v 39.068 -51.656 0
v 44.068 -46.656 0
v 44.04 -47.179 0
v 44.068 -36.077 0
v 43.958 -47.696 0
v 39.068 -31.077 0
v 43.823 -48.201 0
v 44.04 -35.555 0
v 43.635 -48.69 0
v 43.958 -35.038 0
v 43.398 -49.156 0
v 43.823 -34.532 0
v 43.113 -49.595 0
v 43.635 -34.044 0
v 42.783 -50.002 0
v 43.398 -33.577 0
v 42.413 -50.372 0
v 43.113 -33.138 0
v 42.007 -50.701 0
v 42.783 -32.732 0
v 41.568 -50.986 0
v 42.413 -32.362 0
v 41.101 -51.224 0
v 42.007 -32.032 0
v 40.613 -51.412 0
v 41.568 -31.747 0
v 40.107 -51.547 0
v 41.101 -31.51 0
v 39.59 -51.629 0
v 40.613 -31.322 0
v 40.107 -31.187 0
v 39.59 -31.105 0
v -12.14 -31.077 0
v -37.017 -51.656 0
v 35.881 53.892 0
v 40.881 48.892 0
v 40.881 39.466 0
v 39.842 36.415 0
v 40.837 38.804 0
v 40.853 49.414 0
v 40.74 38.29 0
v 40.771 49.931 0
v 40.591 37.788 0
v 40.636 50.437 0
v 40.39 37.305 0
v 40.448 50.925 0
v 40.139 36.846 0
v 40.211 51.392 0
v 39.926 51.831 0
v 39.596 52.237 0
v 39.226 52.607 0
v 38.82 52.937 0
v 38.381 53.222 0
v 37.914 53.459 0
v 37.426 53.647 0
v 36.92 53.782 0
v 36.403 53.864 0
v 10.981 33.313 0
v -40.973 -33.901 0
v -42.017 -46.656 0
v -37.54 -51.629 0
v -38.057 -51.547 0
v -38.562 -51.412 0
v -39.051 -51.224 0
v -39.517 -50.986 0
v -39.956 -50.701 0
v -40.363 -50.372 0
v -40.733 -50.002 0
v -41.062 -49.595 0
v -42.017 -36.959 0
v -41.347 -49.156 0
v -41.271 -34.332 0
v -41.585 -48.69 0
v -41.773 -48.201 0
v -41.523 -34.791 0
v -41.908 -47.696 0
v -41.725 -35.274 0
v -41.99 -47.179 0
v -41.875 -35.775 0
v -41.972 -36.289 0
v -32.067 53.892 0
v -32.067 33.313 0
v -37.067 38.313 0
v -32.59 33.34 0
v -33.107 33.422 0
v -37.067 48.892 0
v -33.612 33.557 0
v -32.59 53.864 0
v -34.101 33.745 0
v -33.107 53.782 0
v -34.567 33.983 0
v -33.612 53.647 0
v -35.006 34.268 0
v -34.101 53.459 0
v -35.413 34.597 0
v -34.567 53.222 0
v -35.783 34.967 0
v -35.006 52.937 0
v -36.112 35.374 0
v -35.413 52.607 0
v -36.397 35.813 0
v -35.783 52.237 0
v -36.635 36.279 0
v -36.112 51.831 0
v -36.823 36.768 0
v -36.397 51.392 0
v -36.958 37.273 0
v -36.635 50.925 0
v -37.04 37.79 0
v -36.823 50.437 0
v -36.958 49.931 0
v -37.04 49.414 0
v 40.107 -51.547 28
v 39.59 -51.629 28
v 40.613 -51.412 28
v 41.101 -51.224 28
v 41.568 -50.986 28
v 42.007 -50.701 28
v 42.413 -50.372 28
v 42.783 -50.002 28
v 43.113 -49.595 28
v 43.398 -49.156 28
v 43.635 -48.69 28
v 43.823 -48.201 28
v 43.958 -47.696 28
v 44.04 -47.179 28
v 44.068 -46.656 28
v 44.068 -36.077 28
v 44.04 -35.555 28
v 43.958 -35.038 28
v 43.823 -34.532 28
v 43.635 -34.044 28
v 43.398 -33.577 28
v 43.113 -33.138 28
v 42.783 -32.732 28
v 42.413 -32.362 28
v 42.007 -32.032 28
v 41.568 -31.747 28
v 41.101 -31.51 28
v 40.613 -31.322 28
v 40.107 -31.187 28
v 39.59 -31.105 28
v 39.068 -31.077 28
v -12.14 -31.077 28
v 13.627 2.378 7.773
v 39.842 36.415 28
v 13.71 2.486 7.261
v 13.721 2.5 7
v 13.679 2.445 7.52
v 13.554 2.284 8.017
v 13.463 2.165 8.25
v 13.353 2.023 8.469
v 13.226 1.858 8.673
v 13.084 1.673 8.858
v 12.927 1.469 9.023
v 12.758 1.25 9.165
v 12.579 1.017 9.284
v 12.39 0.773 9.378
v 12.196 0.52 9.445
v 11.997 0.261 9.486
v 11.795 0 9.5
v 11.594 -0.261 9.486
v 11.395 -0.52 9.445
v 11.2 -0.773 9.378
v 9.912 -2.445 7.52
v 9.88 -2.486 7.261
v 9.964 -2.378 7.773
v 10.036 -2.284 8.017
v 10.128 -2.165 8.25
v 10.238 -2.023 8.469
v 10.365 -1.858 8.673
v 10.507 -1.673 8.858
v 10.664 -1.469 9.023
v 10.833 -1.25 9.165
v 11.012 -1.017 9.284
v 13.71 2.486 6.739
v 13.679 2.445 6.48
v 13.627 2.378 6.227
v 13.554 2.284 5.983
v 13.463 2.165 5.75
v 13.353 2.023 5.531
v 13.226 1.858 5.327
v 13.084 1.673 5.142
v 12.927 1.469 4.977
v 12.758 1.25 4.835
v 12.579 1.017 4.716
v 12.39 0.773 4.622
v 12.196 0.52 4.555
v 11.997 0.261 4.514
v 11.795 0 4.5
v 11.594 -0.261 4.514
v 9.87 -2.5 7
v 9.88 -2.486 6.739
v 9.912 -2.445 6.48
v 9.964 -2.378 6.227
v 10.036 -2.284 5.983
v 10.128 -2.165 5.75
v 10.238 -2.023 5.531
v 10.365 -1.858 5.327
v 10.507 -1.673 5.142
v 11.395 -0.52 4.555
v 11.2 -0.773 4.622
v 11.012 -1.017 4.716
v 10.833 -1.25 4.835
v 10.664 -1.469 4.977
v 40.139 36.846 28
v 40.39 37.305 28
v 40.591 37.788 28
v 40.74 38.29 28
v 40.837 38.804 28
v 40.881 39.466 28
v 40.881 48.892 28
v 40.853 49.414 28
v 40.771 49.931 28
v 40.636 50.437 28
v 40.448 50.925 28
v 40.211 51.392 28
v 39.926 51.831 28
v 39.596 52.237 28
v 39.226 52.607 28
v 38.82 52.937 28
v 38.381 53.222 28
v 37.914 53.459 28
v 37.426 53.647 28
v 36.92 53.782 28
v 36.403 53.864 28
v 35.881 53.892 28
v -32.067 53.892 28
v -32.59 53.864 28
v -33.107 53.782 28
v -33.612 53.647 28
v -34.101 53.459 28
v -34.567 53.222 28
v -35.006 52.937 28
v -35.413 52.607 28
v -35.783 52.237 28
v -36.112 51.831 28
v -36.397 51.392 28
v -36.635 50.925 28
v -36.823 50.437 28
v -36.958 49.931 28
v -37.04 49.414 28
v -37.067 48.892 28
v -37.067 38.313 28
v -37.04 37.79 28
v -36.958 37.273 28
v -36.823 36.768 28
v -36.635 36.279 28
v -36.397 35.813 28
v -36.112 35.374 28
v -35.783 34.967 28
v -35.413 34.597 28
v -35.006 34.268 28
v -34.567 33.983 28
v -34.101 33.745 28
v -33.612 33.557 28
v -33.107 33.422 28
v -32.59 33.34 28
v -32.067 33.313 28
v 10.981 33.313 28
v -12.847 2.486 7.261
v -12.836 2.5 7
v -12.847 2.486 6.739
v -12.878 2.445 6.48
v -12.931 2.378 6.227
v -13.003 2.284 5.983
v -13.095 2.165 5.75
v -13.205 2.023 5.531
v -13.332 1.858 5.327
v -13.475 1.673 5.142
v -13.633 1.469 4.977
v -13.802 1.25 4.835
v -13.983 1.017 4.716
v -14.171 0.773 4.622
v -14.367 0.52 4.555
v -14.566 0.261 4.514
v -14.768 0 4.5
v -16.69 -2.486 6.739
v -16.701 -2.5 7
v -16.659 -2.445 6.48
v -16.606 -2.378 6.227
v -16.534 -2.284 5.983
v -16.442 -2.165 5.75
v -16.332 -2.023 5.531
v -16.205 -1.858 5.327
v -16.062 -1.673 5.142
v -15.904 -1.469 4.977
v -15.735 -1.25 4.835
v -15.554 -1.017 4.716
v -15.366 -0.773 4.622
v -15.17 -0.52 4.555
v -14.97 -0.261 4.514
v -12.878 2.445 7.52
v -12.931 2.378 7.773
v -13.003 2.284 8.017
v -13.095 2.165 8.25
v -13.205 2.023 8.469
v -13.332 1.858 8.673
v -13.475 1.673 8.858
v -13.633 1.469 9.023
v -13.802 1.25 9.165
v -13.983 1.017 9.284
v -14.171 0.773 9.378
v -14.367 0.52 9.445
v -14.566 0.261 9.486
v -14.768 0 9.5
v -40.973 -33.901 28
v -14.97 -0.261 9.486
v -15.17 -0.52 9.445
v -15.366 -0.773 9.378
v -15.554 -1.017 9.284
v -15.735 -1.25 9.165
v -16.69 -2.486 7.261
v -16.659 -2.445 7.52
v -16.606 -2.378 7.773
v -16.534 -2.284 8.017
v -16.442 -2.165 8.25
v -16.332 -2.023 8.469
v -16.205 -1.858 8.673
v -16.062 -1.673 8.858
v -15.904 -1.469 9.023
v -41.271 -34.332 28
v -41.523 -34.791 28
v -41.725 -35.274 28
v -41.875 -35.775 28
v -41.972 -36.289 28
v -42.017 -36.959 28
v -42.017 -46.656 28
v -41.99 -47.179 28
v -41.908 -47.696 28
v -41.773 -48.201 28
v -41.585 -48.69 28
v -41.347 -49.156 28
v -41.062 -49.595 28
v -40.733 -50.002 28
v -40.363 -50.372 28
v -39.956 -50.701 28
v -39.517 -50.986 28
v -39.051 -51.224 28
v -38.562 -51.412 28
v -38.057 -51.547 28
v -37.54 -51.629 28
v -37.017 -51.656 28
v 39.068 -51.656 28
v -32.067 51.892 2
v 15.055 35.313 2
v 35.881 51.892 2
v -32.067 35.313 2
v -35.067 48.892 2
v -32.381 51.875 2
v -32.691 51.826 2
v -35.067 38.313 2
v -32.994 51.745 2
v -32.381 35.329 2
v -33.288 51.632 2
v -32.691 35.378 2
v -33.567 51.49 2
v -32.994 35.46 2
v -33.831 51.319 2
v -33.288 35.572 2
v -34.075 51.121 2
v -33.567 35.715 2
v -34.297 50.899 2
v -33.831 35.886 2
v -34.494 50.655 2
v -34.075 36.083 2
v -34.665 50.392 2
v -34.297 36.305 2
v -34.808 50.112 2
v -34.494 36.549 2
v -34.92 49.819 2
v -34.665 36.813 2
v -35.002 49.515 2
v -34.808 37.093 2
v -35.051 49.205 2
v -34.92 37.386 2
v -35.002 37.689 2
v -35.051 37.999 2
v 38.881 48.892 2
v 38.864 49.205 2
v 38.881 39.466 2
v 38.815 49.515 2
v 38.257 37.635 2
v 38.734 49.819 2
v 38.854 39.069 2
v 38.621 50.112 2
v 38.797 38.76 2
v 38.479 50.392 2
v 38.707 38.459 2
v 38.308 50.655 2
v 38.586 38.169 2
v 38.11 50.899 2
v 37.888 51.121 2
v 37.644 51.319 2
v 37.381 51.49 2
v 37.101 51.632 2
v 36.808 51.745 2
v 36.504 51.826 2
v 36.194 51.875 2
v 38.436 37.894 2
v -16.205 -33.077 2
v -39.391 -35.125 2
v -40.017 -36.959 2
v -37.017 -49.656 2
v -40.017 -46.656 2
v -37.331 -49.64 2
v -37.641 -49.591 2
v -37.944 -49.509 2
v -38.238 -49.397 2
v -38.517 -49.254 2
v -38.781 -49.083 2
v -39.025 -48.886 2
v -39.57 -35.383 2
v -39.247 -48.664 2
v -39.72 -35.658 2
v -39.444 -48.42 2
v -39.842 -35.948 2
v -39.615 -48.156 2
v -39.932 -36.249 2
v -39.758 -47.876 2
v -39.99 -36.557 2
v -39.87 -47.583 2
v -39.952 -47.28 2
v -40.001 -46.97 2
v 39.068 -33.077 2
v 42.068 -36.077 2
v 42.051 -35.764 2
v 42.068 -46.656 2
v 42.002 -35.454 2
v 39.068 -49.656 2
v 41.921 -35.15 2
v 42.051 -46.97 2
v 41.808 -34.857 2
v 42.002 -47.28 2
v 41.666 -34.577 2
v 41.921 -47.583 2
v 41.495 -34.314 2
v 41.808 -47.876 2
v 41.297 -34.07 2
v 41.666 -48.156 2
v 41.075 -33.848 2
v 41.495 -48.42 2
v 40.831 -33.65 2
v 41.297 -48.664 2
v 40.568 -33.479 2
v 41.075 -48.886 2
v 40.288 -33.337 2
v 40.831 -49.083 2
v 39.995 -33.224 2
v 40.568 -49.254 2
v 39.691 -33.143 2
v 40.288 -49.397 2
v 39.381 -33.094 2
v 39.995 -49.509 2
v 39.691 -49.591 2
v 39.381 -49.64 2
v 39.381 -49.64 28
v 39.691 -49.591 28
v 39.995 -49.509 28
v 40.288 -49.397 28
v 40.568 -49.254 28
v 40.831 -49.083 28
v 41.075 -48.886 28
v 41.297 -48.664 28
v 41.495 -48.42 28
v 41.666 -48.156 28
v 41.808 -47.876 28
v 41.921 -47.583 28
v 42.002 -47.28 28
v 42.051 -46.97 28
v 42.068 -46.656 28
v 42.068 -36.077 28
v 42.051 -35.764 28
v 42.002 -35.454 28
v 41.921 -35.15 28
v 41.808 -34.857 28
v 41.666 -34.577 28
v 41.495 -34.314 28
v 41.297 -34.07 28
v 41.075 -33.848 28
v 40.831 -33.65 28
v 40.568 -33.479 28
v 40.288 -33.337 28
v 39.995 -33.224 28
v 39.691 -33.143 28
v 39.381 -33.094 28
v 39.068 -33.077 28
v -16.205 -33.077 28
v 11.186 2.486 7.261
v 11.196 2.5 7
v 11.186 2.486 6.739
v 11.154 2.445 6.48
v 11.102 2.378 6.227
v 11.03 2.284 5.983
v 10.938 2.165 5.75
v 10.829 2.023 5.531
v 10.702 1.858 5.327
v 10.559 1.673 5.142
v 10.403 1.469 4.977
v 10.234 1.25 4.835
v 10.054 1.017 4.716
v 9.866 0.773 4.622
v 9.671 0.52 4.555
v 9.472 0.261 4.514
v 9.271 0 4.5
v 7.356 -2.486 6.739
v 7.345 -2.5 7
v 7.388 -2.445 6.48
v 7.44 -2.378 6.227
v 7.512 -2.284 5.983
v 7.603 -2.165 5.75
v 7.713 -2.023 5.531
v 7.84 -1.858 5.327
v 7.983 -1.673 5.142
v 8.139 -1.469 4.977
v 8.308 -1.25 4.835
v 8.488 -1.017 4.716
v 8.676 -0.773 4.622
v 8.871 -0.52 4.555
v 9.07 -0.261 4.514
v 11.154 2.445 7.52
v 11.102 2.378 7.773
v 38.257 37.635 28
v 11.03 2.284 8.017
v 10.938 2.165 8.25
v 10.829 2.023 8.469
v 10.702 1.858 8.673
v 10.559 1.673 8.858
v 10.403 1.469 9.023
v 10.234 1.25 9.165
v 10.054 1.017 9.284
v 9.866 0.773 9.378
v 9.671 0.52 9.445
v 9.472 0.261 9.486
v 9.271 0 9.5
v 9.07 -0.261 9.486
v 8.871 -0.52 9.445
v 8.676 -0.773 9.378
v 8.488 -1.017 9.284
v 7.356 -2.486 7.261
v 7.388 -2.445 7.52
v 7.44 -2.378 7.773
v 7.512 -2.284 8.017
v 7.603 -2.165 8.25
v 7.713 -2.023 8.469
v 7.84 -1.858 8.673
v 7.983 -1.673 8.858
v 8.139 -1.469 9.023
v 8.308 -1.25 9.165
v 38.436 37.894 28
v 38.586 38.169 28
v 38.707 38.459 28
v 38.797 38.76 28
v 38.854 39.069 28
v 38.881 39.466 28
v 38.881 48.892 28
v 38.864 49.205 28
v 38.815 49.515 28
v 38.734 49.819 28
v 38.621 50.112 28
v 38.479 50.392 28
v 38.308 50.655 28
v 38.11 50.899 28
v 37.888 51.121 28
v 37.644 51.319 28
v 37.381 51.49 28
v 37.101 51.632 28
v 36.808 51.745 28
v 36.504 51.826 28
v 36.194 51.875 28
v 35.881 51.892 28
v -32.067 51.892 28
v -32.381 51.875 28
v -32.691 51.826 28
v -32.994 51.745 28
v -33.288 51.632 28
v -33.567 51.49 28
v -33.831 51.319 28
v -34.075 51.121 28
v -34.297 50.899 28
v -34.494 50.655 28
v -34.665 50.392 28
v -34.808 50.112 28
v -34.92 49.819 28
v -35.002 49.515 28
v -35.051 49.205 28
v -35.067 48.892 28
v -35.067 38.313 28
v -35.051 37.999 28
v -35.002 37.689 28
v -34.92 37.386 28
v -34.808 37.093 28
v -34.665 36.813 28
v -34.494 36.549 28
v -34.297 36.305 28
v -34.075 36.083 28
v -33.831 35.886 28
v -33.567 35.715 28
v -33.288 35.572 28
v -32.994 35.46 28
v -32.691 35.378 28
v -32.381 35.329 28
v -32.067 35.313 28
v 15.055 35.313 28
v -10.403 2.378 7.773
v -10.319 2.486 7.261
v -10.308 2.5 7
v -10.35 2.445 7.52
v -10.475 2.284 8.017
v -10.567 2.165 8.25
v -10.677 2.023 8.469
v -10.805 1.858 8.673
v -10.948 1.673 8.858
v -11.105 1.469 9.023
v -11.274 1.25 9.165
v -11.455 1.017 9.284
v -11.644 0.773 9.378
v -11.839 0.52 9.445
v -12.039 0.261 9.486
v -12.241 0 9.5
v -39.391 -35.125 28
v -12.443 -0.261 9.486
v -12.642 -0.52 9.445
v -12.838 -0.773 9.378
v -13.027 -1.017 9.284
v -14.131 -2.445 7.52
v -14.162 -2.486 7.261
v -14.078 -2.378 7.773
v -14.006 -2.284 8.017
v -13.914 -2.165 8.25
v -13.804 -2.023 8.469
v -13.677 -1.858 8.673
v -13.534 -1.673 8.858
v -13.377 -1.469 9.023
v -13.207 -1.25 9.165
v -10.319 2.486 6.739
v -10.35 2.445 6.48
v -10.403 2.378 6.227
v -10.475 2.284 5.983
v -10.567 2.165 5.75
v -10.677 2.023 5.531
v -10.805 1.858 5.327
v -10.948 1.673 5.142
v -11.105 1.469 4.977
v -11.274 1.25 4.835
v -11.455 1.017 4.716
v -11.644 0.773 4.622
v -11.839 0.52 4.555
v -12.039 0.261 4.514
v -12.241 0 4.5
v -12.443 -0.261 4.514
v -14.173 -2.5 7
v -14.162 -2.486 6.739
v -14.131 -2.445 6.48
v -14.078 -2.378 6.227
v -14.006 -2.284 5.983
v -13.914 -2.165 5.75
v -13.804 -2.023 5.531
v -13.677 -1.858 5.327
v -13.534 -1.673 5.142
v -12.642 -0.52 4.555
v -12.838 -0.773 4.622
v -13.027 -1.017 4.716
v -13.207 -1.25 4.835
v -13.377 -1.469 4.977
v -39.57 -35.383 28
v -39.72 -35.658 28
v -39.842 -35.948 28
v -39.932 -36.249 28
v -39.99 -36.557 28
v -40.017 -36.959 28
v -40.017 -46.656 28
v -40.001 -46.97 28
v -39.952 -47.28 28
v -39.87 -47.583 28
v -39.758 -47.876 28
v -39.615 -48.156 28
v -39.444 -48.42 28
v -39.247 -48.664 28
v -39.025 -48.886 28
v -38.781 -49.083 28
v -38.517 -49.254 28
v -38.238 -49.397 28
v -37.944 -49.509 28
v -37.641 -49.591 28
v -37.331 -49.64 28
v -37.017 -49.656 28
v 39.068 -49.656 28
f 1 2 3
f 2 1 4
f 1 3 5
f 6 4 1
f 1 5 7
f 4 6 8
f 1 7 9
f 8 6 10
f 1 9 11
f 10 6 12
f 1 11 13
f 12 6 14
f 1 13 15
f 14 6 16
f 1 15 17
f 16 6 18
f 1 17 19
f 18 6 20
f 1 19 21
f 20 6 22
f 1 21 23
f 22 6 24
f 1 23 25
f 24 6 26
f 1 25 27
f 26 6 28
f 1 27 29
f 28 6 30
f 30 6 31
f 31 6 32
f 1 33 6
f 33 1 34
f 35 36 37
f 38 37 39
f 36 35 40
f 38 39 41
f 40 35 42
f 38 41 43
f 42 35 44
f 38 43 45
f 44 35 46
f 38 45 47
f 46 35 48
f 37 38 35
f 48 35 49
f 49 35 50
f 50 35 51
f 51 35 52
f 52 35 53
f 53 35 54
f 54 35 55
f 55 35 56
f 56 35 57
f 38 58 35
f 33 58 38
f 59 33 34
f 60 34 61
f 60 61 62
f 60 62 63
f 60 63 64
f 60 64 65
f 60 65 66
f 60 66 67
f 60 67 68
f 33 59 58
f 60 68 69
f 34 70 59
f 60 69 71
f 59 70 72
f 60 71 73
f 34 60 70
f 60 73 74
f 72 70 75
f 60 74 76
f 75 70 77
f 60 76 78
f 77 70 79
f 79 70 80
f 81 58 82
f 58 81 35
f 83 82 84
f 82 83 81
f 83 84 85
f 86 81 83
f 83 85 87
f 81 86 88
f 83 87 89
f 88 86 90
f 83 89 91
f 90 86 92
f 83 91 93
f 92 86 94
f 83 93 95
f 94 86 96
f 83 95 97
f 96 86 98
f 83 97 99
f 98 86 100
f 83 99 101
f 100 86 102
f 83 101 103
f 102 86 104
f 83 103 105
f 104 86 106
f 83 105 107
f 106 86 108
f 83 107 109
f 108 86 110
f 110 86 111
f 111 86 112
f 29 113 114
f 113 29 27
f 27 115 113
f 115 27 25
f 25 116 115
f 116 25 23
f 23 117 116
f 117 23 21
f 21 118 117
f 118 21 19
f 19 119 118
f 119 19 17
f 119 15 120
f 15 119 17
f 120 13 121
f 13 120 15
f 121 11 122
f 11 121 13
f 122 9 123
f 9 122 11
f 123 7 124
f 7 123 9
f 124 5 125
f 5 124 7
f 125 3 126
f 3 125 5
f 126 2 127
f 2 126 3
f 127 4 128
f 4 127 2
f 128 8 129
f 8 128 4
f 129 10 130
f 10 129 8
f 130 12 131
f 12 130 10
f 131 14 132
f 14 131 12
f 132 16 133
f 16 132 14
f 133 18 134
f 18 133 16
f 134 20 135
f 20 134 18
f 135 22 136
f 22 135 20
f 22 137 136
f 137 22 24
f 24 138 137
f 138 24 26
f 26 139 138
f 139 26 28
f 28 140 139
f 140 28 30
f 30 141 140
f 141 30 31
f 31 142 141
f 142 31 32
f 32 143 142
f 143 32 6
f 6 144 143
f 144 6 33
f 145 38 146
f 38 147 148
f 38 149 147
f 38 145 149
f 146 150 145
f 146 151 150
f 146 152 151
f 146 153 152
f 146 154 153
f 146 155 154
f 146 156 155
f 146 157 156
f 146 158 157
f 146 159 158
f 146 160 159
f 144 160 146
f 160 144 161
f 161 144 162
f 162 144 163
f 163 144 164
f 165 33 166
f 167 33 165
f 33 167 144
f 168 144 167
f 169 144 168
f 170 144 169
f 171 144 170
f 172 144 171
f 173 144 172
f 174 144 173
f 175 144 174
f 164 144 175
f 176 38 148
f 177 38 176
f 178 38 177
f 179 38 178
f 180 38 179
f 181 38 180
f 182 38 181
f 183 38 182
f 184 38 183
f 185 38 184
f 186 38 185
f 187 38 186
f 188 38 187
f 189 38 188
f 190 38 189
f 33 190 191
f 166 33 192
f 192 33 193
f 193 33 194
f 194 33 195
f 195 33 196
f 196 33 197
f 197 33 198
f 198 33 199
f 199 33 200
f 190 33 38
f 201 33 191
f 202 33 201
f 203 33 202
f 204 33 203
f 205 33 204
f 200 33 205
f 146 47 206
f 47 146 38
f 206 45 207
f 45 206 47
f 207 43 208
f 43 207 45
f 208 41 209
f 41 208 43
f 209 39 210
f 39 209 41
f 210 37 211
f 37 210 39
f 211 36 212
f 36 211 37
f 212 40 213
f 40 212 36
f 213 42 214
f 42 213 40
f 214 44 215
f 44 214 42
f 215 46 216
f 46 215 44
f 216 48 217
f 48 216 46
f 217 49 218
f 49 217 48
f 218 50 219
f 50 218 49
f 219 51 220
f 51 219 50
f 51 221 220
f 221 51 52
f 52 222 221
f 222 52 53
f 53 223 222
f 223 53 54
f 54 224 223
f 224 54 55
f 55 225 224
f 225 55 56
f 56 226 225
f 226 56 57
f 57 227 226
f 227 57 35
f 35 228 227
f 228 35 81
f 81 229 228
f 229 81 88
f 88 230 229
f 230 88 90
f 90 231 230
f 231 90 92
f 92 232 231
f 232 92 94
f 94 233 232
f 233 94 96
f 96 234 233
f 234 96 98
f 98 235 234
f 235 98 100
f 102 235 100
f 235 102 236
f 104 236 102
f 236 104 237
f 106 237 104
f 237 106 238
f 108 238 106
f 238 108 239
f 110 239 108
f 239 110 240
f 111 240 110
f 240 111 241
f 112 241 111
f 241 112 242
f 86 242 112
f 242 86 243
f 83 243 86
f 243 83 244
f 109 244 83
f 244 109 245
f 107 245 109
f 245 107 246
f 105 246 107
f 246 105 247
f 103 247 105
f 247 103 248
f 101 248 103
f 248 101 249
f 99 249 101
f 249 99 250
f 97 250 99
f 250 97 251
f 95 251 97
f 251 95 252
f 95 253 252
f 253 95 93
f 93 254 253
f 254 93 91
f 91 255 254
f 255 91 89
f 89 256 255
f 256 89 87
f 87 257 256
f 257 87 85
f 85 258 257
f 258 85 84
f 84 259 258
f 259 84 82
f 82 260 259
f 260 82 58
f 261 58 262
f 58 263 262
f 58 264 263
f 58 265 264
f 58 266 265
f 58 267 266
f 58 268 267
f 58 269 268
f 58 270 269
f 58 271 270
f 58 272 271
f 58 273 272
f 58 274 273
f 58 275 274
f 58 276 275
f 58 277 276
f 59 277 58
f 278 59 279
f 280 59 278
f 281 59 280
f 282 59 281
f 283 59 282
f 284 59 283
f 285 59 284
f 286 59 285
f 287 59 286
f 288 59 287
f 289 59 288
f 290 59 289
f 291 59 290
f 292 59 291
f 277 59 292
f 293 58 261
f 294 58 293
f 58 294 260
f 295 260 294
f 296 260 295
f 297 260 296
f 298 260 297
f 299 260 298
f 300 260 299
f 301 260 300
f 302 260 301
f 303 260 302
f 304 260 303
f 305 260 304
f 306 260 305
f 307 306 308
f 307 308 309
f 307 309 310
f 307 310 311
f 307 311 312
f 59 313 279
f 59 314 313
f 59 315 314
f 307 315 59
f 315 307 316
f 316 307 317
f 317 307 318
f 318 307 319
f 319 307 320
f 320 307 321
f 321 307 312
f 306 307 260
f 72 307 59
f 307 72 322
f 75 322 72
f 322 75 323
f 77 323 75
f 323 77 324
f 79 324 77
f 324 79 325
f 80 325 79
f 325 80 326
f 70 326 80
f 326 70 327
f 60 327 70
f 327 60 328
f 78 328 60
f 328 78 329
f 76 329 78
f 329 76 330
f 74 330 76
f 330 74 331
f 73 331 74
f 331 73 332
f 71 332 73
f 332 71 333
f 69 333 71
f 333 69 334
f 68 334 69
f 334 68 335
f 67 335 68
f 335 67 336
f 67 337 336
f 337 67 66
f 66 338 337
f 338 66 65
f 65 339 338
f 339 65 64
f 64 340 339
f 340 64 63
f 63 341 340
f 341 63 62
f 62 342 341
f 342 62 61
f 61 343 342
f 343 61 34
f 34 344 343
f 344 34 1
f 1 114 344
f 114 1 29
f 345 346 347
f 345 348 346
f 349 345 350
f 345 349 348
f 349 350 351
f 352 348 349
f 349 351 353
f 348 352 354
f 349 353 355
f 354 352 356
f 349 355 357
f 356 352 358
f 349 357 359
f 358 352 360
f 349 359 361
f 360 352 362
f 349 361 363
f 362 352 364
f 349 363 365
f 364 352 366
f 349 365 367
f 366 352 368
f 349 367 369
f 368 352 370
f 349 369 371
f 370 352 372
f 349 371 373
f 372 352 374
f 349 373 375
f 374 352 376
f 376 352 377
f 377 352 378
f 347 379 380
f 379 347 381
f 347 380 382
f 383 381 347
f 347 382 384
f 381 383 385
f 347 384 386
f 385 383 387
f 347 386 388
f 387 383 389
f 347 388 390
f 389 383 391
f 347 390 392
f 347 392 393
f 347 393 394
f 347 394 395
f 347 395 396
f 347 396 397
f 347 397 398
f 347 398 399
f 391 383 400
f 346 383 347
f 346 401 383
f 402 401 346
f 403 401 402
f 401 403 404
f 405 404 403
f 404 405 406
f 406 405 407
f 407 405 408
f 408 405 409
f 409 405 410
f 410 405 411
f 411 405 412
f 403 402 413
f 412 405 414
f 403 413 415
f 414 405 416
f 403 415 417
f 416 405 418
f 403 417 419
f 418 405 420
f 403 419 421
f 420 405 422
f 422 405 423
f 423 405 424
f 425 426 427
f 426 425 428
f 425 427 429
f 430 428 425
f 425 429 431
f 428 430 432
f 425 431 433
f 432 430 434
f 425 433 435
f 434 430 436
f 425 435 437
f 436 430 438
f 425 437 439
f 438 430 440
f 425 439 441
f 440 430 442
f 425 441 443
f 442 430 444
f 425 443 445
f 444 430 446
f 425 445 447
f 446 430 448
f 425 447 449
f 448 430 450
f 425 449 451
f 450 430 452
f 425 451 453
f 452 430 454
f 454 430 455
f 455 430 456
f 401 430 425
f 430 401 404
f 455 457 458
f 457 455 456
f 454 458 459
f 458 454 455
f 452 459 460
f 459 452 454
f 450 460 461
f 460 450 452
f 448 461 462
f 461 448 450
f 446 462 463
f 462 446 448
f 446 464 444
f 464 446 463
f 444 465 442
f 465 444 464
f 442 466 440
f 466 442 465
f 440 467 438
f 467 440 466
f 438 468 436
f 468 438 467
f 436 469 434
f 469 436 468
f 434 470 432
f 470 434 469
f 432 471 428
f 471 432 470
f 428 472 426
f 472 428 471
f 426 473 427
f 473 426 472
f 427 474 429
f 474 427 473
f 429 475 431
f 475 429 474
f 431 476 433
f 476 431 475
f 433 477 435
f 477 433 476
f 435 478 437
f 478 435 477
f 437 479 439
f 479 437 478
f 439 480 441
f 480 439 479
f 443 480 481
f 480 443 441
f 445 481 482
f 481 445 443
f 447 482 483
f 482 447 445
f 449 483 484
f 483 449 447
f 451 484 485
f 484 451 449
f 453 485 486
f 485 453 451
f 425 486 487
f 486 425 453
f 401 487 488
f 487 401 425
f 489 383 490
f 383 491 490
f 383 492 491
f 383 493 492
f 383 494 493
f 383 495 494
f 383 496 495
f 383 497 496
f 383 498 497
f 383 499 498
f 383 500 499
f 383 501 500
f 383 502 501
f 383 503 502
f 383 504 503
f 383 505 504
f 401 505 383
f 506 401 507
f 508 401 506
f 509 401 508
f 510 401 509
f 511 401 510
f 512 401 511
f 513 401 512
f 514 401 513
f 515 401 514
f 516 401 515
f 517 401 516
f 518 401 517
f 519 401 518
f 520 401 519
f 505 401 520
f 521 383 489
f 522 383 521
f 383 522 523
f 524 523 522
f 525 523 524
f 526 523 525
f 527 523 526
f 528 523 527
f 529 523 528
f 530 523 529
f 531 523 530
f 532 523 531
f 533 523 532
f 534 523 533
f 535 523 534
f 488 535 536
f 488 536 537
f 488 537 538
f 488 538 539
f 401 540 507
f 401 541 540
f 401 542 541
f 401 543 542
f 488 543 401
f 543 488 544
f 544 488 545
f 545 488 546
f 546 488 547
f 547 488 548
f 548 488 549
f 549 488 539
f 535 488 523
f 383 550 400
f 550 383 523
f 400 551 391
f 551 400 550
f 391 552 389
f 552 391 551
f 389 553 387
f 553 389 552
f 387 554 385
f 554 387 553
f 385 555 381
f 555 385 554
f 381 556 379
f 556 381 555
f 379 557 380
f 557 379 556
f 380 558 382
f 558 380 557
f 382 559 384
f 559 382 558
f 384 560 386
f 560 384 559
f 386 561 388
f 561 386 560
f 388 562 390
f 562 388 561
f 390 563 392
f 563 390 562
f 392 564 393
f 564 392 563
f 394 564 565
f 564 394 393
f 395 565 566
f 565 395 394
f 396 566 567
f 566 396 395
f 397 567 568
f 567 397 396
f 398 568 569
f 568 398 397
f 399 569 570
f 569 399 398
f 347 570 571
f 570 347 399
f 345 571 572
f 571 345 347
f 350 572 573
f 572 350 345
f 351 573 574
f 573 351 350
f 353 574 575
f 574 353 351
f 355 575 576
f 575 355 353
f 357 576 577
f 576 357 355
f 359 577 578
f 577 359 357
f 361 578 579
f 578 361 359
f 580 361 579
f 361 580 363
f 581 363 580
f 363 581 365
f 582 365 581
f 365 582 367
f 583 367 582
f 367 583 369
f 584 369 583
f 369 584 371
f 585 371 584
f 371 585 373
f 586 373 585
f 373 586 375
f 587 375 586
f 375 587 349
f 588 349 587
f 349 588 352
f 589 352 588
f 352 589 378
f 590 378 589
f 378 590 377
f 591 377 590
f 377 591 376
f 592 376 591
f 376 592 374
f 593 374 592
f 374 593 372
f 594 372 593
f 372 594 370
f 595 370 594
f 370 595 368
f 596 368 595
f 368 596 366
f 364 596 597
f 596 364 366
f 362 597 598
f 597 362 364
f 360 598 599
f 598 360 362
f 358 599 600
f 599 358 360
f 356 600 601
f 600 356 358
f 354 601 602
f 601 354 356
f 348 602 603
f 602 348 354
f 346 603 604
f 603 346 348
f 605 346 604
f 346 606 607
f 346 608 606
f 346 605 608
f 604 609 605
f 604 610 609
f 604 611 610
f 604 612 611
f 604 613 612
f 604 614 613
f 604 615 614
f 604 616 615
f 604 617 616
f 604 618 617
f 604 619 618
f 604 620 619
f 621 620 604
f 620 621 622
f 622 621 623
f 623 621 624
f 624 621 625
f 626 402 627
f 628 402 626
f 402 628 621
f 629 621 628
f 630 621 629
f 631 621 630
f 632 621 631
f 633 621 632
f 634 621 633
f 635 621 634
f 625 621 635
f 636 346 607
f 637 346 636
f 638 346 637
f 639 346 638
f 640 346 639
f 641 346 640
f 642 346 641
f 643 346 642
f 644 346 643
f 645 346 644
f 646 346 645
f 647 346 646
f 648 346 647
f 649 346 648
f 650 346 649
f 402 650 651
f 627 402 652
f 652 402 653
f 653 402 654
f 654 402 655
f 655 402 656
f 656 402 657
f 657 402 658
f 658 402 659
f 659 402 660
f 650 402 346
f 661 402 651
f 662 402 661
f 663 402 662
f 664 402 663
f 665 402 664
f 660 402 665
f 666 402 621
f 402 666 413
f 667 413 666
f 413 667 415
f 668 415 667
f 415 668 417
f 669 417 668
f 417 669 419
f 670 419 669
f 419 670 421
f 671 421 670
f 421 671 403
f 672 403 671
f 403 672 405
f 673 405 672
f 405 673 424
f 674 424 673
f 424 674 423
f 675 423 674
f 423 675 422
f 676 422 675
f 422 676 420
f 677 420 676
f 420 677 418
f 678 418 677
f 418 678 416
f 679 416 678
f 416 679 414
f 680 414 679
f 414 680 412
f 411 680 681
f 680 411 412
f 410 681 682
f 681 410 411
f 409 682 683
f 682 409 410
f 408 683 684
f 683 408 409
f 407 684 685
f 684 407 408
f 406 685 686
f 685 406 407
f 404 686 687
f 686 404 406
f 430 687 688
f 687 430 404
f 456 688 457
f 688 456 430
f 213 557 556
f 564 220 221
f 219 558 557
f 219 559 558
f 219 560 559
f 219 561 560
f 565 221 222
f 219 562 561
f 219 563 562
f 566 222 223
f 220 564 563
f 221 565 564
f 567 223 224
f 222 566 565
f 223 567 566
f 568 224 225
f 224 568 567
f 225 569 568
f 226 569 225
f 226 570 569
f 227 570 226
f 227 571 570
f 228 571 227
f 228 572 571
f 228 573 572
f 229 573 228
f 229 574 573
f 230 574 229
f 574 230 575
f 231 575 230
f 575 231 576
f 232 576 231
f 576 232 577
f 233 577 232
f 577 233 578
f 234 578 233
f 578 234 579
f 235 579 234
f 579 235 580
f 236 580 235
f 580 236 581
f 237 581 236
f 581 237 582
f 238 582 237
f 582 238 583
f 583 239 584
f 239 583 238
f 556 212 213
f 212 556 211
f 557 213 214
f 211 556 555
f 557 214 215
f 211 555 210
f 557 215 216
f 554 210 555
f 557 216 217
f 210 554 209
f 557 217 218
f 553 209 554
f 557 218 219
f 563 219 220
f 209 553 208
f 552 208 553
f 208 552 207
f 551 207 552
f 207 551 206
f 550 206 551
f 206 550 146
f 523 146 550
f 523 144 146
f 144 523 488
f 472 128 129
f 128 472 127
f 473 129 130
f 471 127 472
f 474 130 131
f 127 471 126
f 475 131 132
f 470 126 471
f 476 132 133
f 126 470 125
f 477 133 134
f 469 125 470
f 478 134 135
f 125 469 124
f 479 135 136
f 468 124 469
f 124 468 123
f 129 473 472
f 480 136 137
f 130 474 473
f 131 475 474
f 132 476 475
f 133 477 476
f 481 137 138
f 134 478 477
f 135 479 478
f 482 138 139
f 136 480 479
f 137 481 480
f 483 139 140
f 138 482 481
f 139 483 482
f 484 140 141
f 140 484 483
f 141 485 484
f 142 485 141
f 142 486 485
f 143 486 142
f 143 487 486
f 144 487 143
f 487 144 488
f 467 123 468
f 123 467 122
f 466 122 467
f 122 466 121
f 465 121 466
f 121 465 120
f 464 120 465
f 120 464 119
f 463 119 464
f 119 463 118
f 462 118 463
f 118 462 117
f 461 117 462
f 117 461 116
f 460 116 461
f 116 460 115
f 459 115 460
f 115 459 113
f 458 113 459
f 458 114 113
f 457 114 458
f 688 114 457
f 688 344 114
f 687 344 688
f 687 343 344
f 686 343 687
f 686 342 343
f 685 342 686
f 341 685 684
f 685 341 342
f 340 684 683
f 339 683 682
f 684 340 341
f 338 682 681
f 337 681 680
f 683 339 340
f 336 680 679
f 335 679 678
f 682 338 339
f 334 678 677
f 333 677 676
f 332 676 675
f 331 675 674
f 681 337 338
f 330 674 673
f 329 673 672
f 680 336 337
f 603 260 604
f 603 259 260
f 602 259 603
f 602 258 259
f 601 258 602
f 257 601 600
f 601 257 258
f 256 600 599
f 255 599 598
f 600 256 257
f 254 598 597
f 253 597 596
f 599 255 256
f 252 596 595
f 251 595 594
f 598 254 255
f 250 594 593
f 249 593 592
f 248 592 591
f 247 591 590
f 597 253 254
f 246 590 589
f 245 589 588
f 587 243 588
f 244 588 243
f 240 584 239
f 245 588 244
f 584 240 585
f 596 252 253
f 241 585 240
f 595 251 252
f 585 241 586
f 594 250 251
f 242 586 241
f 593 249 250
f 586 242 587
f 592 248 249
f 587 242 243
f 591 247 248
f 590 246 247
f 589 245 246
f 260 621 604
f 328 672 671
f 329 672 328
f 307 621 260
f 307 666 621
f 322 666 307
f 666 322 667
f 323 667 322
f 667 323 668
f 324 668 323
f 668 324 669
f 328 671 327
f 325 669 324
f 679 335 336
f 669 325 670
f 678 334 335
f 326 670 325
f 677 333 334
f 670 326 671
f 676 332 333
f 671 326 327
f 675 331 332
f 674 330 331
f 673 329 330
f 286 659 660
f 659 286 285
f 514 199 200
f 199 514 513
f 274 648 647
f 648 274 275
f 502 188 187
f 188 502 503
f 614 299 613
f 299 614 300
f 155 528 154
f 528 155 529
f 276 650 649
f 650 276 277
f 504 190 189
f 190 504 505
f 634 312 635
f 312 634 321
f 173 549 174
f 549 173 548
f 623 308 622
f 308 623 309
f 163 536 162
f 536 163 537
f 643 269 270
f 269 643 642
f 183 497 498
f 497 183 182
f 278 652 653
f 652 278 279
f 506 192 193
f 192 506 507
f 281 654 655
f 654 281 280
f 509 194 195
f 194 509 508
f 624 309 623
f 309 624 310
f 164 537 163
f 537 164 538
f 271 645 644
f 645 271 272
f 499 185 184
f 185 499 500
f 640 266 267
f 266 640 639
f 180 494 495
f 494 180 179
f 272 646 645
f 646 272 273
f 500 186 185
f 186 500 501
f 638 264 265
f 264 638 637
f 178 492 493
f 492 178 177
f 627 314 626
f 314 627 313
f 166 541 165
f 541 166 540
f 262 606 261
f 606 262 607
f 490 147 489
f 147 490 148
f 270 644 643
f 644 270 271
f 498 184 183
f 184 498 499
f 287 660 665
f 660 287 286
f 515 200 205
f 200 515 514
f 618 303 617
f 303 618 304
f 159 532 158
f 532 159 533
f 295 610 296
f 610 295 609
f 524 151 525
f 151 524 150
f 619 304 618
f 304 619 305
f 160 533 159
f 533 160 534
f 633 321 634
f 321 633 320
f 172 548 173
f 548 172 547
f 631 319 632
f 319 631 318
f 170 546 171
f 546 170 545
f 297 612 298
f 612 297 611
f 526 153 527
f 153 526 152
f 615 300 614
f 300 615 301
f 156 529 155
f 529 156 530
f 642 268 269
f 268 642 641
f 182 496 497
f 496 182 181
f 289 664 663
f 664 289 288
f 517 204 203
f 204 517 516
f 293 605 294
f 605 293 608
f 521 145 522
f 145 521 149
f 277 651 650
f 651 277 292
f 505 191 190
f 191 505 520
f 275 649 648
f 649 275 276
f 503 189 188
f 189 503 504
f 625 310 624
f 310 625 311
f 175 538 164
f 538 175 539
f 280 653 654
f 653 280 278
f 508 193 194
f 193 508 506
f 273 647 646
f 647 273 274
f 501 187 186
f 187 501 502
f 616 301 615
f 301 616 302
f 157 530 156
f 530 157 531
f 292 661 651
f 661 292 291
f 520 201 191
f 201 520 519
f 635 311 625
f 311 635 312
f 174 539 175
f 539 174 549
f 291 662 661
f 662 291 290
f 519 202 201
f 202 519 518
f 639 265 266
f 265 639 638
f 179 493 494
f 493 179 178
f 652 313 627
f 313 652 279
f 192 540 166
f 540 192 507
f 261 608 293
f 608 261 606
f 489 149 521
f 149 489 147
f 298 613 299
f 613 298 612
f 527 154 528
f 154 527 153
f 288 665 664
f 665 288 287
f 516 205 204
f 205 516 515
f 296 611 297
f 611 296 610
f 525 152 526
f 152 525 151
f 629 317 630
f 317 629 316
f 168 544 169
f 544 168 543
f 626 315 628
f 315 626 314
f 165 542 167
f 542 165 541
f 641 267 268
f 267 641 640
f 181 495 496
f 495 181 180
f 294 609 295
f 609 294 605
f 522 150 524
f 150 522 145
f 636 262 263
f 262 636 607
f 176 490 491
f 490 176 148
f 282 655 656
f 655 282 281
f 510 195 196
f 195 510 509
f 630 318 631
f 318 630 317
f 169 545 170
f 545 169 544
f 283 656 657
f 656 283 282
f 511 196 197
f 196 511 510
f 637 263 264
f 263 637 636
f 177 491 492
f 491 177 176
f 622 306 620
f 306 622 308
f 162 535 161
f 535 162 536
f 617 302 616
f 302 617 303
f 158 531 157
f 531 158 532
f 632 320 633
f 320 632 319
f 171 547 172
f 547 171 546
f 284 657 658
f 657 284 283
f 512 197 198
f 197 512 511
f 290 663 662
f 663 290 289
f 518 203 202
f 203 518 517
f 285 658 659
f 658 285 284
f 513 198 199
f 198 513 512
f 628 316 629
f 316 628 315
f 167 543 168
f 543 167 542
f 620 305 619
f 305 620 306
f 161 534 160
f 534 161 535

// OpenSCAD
// AUTOMATICALLY GENERATED FILE: Letter_Z
// SIGN SCULPTOR ENGINE V2

Render_Mode = "Body"; // Set to "Lid" to export the cover
Letter = "Z";
Font_Size = 100;
Font_Name = "Arial:style=Black";
Light_Type = "Silicone_Neon_6mm";

// -- Engineering Constants --
Sign_Height = 30.0;
Wall_Thickness = 2.0;
Base_Thickness = 2.0;
Lid_Tolerance = 0.15;
Hole_Height = 5.0;
Hole_Size = 5.0;

// -- Logic Engine --
CW = (Light_Type == "Silicone_Neon_6mm") ? 6.0 :
     (Light_Type == "Silicone_Neon_8mm") ? 8.0 :
     (Light_Type == "LED_Strip_10mm")    ? 10.5 :
     (Light_Type == "Individual_Pixels")  ? 14.0 : 6.0;

Lip_Overhang = (Light_Type == "Silicone_Neon_6mm" || Light_Type == "Silicone_Neon_8mm") ? 0.4 : 0.0;

$fn = 60;

module letter_shape() {
    text(text=Letter, size=Font_Size, font=Font_Name, halign="center", valign="center");
}

module body_geometry() {
    difference() {
        // 1. Positive Block
        linear_extrude(Sign_Height)
            offset(r = CW/2 + Wall_Thickness)
            letter_shape();

        // 2. Light Channel
        translate([0,0, Base_Thickness])
            linear_extrude(Sign_Height + 1)
            offset(r = CW/2)
            letter_shape();

        // 3. Friction Lip
        if (Lip_Overhang > 0) {
            translate([0,0, Sign_Height - 2.0])
                linear_extrude(3.0)
                difference() {
                    offset(r = CW/2 + 5) letter_shape();
                    offset(r = CW/2 - Lip_Overhang) letter_shape();
                }
        }
        
        // 4. Lid Shelf
        translate([0,0, Sign_Height - 2.0])
            linear_extrude(3.0)
            offset(r = CW/2 + 1.5)
            letter_shape();

        // 5. WIRE CHANNELS (Dynamic Side Holes)
        // Left Hole
        translate([-Font_Size/1.8, 0, Hole_Height + Base_Thickness])
            rotate([0, 90, 0])
            cylinder(h = Font_Size, r = Hole_Size/2);
            
        // Right Hole
        translate([Font_Size/1.8, 0, Hole_Height + Base_Thickness])
            rotate([0, -90, 0])
            cylinder(h = Font_Size, r = Hole_Size/2);
    }
}

module lid_geometry() {
    color("White")
        linear_extrude(2.0)
        offset(r = (CW/2 + 1.5) - Lid_Tolerance)
        letter_shape();
}

// Render Controller
if (Render_Mode == "Body") {
    body_geometry();
} else if (Render_Mode == "Lid") {
    lid_geometry();
}
